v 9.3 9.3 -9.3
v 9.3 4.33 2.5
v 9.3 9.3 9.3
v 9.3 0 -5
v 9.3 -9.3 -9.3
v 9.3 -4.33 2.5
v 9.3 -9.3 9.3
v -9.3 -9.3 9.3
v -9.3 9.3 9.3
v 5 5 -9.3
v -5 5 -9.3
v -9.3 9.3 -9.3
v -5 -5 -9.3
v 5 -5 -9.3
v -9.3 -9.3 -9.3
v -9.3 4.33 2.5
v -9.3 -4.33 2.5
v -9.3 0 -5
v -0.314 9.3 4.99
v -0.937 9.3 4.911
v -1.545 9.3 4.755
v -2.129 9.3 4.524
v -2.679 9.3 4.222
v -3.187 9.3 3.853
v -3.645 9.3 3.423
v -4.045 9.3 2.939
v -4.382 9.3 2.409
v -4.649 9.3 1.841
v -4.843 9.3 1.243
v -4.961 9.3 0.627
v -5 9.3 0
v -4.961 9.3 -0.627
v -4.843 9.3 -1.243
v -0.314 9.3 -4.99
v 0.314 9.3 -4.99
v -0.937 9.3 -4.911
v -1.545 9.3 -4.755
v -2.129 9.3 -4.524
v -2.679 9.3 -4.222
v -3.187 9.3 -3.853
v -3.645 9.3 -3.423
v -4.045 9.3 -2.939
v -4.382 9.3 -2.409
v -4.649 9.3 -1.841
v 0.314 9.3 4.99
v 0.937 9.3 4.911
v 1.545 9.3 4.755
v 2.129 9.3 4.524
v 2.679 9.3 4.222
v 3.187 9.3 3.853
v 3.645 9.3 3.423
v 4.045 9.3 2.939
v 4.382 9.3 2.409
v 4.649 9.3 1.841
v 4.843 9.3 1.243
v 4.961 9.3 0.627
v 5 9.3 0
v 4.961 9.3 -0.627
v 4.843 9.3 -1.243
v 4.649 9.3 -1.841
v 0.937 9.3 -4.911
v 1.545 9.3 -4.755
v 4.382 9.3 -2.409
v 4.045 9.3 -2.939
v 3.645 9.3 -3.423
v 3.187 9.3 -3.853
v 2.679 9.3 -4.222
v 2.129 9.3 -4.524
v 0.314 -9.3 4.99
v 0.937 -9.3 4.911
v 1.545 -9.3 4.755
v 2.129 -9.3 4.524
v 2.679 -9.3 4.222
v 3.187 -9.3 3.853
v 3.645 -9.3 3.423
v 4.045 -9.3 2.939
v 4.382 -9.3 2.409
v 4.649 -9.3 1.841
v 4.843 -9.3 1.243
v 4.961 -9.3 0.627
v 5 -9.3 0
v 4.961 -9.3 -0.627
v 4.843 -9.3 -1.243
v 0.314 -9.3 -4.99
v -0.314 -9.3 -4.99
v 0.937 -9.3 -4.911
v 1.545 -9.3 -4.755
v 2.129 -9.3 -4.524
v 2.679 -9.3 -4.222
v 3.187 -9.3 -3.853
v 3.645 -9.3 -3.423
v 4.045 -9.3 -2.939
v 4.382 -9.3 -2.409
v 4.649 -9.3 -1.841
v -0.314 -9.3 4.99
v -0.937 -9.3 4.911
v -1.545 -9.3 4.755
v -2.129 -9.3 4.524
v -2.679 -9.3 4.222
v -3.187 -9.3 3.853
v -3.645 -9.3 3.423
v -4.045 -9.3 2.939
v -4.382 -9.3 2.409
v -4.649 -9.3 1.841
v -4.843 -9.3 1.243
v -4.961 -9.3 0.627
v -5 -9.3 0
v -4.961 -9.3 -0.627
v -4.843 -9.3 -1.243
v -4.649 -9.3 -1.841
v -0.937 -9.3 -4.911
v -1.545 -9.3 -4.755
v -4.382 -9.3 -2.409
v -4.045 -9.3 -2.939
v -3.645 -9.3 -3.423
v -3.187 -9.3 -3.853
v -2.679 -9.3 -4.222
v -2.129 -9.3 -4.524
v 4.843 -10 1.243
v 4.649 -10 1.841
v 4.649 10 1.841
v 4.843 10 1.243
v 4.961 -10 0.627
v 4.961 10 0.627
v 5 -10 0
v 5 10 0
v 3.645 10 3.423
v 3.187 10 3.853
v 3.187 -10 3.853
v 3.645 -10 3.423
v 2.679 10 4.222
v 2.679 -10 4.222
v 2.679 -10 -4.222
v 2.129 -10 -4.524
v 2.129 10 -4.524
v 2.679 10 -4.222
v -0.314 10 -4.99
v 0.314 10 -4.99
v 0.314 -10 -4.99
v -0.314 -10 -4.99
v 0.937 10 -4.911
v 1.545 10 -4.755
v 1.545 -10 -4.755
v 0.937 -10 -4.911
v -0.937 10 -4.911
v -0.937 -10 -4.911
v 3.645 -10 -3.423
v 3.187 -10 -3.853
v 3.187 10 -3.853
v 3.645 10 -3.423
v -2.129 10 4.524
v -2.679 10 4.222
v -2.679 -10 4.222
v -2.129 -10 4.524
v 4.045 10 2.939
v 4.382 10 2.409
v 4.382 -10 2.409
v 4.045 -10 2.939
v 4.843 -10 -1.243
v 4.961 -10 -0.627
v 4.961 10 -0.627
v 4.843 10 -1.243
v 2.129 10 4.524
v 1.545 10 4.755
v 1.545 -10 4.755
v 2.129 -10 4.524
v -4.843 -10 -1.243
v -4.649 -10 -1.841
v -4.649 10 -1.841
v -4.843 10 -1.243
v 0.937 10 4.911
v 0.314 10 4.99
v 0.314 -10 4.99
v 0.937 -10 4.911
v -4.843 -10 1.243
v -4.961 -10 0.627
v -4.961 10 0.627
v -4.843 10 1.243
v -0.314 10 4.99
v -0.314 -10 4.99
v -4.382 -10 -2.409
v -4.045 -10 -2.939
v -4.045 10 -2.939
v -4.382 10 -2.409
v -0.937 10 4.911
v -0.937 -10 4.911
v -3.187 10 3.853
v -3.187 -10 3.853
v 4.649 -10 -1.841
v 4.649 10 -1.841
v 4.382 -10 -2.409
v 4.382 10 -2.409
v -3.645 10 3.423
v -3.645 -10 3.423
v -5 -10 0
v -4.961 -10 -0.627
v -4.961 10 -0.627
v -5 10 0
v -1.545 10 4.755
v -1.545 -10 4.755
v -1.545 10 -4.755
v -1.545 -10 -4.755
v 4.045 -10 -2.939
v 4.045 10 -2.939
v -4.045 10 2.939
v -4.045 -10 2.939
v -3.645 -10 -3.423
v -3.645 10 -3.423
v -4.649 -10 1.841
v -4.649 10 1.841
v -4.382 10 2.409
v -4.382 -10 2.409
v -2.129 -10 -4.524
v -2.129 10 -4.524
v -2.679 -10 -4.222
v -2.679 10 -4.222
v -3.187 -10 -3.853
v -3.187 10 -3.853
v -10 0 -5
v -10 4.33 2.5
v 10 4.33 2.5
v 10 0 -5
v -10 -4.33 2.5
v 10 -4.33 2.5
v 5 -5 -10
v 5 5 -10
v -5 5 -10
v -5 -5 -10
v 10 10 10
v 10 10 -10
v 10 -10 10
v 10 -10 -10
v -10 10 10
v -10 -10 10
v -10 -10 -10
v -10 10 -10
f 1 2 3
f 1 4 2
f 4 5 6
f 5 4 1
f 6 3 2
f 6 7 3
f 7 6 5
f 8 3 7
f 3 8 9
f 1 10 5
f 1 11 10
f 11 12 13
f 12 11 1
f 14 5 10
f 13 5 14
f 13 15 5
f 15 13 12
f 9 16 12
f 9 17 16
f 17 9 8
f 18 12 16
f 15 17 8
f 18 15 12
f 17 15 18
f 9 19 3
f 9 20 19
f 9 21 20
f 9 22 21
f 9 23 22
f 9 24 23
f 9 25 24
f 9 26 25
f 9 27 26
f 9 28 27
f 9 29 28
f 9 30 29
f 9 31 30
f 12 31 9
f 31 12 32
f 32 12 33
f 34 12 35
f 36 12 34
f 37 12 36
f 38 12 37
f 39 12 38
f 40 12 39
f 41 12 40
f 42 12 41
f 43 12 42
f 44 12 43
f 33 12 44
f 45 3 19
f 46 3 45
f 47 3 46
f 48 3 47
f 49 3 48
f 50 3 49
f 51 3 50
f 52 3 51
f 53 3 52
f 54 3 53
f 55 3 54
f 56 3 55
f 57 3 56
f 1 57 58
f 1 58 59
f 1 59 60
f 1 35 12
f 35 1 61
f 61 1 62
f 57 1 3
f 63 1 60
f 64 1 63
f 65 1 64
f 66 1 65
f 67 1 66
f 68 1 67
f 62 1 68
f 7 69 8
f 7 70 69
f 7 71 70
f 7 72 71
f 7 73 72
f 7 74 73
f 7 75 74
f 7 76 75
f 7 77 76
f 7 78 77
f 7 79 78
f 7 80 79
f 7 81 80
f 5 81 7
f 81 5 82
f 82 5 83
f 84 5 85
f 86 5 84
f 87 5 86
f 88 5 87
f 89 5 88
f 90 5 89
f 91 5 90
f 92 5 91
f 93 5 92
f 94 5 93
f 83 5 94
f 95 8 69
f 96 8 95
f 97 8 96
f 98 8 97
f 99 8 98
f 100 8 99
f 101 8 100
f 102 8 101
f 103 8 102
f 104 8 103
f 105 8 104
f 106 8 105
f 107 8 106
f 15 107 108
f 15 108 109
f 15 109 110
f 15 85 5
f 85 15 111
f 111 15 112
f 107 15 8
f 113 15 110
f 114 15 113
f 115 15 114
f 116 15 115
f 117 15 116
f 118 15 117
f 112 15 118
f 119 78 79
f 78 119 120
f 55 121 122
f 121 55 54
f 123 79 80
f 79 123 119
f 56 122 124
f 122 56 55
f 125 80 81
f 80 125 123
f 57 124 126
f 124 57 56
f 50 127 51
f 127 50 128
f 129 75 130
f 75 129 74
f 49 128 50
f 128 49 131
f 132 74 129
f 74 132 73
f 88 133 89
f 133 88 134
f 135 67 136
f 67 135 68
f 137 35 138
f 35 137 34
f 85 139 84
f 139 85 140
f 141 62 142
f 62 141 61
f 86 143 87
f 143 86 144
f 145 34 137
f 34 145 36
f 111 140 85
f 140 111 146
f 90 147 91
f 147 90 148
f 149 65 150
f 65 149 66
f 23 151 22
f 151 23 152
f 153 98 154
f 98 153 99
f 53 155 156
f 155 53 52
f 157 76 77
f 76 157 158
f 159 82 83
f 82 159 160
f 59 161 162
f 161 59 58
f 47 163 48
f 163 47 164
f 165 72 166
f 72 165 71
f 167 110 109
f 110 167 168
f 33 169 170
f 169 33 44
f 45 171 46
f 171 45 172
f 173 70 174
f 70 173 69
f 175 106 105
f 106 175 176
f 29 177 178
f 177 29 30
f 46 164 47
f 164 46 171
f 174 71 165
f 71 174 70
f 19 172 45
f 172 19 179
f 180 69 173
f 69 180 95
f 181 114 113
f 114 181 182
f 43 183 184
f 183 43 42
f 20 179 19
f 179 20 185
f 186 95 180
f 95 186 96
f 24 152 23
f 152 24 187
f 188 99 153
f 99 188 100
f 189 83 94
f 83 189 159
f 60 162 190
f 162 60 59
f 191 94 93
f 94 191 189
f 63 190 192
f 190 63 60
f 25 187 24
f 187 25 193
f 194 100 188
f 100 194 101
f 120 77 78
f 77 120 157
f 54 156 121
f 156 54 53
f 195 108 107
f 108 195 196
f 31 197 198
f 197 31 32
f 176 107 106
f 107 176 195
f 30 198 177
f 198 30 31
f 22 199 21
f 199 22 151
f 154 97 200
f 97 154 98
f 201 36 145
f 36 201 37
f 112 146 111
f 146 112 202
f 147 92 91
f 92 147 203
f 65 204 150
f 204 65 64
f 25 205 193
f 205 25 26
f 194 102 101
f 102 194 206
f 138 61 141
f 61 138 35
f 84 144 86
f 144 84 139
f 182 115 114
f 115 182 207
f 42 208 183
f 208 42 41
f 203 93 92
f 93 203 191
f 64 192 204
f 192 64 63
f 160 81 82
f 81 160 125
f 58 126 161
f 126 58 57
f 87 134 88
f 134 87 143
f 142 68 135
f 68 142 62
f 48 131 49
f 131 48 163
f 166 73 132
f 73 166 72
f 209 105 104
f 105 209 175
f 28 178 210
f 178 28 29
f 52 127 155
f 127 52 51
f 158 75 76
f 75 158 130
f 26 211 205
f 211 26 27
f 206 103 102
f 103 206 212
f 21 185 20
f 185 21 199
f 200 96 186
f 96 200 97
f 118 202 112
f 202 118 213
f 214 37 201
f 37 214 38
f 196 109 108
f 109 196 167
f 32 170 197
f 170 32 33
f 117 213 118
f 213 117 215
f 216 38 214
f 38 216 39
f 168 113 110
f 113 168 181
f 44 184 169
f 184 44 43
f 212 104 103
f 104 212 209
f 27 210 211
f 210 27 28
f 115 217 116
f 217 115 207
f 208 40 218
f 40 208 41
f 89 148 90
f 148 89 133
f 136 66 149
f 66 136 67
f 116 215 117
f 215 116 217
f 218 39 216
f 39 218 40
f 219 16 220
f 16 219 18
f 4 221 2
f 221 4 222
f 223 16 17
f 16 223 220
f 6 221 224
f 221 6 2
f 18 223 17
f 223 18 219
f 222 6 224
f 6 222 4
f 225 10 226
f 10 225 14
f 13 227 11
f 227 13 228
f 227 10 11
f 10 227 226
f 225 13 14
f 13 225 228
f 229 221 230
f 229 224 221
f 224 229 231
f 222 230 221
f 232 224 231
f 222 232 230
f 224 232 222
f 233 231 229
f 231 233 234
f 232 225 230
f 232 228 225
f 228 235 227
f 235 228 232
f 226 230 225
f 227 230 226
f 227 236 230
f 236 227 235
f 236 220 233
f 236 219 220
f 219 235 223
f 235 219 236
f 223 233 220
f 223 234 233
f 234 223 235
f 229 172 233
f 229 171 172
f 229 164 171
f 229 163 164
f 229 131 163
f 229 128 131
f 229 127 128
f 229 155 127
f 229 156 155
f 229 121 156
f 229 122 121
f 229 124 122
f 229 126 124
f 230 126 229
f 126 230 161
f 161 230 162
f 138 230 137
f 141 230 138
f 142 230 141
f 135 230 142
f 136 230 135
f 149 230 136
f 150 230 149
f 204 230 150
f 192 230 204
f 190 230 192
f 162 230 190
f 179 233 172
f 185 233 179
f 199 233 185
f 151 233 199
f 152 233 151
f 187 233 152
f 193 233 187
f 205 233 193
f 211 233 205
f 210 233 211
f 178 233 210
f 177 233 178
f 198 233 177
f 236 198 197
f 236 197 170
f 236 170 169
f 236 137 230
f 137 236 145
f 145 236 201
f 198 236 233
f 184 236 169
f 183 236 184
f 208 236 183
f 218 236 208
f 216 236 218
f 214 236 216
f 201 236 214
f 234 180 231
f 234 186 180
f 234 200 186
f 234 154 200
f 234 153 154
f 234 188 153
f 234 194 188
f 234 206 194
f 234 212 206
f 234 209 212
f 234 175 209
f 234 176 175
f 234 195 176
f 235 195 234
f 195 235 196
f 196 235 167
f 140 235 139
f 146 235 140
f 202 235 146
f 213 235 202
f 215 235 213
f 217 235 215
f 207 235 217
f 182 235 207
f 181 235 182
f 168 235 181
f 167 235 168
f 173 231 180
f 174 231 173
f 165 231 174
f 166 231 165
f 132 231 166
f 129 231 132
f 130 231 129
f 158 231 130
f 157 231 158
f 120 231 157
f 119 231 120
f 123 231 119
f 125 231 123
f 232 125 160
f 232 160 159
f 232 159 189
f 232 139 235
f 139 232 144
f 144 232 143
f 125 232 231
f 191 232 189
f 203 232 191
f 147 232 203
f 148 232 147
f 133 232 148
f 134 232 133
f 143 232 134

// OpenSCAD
// Parameterised Printer Calibration Cube
// Author:  Nick Wells
// Created: 11/07/2018
// Version: 1.0

// Use this cube to help you choose the optimal slicer settings.
// The cube has thin walls with holes and a bridged top.
// You will need good bridging settings and retractions to get a nice clean print.
// The cutouts in the sides will also show up any ringing usually caused by loose drive belts
// As the walls are thin it prints quickly too!

// ### ADJUSTABLE PARAMETERS ###
// Set this value to your nozzle size 
nozzle_size = 0.35; // [0.1:0.05:1.0]
// External cube dimensions
size        = 20; // [10:100]   
// Number of exterior walls
wall        = 2;  // [1:10]  
// ### END OF PARAMETERS ###


// Render the cube
MyTestCube();

// I always code this way as it makes cutting multiple holes in solid shapes much easier!
module MyTestCube()
{
  difference()
  {
    body();   // 1) Make the cube
    holes();  // 2) Cut oway the holes
  }
}



// Put code for the solid part in here
module body()
{
  cube(size,center=true);
}



// Put code for holes and removed sections in here 
module holes()
{
  // 1) Hollow out the cube
  cutout = size - nozzle_size*2*wall;
  cube(cutout,center=true);
  
  // 2) Cut the circular holes
  // Render circles with 100 segments
  $fn=50;
  rotate([90,0,0])cylinder(d=size/2,h=size+nozzle_size,center=true);
  
  // 3) Cut the triangular holes
  rotate([0,90,0])
  {
    // This is a neat little trick that renders a cylinder with 3 points making a triangle!
    $fn=3;
    cylinder(d=size/2,h=size+nozzle_size,center=true);
  }
  
  // 4) Cut the square hole
  // Heres a tip, put a # at the start of the next line and press F5 to render
  // The cube will show in red, this is a really usefull debugging tool!
  translate([0,0,-size/2])cube(size/2,center=true);
}
